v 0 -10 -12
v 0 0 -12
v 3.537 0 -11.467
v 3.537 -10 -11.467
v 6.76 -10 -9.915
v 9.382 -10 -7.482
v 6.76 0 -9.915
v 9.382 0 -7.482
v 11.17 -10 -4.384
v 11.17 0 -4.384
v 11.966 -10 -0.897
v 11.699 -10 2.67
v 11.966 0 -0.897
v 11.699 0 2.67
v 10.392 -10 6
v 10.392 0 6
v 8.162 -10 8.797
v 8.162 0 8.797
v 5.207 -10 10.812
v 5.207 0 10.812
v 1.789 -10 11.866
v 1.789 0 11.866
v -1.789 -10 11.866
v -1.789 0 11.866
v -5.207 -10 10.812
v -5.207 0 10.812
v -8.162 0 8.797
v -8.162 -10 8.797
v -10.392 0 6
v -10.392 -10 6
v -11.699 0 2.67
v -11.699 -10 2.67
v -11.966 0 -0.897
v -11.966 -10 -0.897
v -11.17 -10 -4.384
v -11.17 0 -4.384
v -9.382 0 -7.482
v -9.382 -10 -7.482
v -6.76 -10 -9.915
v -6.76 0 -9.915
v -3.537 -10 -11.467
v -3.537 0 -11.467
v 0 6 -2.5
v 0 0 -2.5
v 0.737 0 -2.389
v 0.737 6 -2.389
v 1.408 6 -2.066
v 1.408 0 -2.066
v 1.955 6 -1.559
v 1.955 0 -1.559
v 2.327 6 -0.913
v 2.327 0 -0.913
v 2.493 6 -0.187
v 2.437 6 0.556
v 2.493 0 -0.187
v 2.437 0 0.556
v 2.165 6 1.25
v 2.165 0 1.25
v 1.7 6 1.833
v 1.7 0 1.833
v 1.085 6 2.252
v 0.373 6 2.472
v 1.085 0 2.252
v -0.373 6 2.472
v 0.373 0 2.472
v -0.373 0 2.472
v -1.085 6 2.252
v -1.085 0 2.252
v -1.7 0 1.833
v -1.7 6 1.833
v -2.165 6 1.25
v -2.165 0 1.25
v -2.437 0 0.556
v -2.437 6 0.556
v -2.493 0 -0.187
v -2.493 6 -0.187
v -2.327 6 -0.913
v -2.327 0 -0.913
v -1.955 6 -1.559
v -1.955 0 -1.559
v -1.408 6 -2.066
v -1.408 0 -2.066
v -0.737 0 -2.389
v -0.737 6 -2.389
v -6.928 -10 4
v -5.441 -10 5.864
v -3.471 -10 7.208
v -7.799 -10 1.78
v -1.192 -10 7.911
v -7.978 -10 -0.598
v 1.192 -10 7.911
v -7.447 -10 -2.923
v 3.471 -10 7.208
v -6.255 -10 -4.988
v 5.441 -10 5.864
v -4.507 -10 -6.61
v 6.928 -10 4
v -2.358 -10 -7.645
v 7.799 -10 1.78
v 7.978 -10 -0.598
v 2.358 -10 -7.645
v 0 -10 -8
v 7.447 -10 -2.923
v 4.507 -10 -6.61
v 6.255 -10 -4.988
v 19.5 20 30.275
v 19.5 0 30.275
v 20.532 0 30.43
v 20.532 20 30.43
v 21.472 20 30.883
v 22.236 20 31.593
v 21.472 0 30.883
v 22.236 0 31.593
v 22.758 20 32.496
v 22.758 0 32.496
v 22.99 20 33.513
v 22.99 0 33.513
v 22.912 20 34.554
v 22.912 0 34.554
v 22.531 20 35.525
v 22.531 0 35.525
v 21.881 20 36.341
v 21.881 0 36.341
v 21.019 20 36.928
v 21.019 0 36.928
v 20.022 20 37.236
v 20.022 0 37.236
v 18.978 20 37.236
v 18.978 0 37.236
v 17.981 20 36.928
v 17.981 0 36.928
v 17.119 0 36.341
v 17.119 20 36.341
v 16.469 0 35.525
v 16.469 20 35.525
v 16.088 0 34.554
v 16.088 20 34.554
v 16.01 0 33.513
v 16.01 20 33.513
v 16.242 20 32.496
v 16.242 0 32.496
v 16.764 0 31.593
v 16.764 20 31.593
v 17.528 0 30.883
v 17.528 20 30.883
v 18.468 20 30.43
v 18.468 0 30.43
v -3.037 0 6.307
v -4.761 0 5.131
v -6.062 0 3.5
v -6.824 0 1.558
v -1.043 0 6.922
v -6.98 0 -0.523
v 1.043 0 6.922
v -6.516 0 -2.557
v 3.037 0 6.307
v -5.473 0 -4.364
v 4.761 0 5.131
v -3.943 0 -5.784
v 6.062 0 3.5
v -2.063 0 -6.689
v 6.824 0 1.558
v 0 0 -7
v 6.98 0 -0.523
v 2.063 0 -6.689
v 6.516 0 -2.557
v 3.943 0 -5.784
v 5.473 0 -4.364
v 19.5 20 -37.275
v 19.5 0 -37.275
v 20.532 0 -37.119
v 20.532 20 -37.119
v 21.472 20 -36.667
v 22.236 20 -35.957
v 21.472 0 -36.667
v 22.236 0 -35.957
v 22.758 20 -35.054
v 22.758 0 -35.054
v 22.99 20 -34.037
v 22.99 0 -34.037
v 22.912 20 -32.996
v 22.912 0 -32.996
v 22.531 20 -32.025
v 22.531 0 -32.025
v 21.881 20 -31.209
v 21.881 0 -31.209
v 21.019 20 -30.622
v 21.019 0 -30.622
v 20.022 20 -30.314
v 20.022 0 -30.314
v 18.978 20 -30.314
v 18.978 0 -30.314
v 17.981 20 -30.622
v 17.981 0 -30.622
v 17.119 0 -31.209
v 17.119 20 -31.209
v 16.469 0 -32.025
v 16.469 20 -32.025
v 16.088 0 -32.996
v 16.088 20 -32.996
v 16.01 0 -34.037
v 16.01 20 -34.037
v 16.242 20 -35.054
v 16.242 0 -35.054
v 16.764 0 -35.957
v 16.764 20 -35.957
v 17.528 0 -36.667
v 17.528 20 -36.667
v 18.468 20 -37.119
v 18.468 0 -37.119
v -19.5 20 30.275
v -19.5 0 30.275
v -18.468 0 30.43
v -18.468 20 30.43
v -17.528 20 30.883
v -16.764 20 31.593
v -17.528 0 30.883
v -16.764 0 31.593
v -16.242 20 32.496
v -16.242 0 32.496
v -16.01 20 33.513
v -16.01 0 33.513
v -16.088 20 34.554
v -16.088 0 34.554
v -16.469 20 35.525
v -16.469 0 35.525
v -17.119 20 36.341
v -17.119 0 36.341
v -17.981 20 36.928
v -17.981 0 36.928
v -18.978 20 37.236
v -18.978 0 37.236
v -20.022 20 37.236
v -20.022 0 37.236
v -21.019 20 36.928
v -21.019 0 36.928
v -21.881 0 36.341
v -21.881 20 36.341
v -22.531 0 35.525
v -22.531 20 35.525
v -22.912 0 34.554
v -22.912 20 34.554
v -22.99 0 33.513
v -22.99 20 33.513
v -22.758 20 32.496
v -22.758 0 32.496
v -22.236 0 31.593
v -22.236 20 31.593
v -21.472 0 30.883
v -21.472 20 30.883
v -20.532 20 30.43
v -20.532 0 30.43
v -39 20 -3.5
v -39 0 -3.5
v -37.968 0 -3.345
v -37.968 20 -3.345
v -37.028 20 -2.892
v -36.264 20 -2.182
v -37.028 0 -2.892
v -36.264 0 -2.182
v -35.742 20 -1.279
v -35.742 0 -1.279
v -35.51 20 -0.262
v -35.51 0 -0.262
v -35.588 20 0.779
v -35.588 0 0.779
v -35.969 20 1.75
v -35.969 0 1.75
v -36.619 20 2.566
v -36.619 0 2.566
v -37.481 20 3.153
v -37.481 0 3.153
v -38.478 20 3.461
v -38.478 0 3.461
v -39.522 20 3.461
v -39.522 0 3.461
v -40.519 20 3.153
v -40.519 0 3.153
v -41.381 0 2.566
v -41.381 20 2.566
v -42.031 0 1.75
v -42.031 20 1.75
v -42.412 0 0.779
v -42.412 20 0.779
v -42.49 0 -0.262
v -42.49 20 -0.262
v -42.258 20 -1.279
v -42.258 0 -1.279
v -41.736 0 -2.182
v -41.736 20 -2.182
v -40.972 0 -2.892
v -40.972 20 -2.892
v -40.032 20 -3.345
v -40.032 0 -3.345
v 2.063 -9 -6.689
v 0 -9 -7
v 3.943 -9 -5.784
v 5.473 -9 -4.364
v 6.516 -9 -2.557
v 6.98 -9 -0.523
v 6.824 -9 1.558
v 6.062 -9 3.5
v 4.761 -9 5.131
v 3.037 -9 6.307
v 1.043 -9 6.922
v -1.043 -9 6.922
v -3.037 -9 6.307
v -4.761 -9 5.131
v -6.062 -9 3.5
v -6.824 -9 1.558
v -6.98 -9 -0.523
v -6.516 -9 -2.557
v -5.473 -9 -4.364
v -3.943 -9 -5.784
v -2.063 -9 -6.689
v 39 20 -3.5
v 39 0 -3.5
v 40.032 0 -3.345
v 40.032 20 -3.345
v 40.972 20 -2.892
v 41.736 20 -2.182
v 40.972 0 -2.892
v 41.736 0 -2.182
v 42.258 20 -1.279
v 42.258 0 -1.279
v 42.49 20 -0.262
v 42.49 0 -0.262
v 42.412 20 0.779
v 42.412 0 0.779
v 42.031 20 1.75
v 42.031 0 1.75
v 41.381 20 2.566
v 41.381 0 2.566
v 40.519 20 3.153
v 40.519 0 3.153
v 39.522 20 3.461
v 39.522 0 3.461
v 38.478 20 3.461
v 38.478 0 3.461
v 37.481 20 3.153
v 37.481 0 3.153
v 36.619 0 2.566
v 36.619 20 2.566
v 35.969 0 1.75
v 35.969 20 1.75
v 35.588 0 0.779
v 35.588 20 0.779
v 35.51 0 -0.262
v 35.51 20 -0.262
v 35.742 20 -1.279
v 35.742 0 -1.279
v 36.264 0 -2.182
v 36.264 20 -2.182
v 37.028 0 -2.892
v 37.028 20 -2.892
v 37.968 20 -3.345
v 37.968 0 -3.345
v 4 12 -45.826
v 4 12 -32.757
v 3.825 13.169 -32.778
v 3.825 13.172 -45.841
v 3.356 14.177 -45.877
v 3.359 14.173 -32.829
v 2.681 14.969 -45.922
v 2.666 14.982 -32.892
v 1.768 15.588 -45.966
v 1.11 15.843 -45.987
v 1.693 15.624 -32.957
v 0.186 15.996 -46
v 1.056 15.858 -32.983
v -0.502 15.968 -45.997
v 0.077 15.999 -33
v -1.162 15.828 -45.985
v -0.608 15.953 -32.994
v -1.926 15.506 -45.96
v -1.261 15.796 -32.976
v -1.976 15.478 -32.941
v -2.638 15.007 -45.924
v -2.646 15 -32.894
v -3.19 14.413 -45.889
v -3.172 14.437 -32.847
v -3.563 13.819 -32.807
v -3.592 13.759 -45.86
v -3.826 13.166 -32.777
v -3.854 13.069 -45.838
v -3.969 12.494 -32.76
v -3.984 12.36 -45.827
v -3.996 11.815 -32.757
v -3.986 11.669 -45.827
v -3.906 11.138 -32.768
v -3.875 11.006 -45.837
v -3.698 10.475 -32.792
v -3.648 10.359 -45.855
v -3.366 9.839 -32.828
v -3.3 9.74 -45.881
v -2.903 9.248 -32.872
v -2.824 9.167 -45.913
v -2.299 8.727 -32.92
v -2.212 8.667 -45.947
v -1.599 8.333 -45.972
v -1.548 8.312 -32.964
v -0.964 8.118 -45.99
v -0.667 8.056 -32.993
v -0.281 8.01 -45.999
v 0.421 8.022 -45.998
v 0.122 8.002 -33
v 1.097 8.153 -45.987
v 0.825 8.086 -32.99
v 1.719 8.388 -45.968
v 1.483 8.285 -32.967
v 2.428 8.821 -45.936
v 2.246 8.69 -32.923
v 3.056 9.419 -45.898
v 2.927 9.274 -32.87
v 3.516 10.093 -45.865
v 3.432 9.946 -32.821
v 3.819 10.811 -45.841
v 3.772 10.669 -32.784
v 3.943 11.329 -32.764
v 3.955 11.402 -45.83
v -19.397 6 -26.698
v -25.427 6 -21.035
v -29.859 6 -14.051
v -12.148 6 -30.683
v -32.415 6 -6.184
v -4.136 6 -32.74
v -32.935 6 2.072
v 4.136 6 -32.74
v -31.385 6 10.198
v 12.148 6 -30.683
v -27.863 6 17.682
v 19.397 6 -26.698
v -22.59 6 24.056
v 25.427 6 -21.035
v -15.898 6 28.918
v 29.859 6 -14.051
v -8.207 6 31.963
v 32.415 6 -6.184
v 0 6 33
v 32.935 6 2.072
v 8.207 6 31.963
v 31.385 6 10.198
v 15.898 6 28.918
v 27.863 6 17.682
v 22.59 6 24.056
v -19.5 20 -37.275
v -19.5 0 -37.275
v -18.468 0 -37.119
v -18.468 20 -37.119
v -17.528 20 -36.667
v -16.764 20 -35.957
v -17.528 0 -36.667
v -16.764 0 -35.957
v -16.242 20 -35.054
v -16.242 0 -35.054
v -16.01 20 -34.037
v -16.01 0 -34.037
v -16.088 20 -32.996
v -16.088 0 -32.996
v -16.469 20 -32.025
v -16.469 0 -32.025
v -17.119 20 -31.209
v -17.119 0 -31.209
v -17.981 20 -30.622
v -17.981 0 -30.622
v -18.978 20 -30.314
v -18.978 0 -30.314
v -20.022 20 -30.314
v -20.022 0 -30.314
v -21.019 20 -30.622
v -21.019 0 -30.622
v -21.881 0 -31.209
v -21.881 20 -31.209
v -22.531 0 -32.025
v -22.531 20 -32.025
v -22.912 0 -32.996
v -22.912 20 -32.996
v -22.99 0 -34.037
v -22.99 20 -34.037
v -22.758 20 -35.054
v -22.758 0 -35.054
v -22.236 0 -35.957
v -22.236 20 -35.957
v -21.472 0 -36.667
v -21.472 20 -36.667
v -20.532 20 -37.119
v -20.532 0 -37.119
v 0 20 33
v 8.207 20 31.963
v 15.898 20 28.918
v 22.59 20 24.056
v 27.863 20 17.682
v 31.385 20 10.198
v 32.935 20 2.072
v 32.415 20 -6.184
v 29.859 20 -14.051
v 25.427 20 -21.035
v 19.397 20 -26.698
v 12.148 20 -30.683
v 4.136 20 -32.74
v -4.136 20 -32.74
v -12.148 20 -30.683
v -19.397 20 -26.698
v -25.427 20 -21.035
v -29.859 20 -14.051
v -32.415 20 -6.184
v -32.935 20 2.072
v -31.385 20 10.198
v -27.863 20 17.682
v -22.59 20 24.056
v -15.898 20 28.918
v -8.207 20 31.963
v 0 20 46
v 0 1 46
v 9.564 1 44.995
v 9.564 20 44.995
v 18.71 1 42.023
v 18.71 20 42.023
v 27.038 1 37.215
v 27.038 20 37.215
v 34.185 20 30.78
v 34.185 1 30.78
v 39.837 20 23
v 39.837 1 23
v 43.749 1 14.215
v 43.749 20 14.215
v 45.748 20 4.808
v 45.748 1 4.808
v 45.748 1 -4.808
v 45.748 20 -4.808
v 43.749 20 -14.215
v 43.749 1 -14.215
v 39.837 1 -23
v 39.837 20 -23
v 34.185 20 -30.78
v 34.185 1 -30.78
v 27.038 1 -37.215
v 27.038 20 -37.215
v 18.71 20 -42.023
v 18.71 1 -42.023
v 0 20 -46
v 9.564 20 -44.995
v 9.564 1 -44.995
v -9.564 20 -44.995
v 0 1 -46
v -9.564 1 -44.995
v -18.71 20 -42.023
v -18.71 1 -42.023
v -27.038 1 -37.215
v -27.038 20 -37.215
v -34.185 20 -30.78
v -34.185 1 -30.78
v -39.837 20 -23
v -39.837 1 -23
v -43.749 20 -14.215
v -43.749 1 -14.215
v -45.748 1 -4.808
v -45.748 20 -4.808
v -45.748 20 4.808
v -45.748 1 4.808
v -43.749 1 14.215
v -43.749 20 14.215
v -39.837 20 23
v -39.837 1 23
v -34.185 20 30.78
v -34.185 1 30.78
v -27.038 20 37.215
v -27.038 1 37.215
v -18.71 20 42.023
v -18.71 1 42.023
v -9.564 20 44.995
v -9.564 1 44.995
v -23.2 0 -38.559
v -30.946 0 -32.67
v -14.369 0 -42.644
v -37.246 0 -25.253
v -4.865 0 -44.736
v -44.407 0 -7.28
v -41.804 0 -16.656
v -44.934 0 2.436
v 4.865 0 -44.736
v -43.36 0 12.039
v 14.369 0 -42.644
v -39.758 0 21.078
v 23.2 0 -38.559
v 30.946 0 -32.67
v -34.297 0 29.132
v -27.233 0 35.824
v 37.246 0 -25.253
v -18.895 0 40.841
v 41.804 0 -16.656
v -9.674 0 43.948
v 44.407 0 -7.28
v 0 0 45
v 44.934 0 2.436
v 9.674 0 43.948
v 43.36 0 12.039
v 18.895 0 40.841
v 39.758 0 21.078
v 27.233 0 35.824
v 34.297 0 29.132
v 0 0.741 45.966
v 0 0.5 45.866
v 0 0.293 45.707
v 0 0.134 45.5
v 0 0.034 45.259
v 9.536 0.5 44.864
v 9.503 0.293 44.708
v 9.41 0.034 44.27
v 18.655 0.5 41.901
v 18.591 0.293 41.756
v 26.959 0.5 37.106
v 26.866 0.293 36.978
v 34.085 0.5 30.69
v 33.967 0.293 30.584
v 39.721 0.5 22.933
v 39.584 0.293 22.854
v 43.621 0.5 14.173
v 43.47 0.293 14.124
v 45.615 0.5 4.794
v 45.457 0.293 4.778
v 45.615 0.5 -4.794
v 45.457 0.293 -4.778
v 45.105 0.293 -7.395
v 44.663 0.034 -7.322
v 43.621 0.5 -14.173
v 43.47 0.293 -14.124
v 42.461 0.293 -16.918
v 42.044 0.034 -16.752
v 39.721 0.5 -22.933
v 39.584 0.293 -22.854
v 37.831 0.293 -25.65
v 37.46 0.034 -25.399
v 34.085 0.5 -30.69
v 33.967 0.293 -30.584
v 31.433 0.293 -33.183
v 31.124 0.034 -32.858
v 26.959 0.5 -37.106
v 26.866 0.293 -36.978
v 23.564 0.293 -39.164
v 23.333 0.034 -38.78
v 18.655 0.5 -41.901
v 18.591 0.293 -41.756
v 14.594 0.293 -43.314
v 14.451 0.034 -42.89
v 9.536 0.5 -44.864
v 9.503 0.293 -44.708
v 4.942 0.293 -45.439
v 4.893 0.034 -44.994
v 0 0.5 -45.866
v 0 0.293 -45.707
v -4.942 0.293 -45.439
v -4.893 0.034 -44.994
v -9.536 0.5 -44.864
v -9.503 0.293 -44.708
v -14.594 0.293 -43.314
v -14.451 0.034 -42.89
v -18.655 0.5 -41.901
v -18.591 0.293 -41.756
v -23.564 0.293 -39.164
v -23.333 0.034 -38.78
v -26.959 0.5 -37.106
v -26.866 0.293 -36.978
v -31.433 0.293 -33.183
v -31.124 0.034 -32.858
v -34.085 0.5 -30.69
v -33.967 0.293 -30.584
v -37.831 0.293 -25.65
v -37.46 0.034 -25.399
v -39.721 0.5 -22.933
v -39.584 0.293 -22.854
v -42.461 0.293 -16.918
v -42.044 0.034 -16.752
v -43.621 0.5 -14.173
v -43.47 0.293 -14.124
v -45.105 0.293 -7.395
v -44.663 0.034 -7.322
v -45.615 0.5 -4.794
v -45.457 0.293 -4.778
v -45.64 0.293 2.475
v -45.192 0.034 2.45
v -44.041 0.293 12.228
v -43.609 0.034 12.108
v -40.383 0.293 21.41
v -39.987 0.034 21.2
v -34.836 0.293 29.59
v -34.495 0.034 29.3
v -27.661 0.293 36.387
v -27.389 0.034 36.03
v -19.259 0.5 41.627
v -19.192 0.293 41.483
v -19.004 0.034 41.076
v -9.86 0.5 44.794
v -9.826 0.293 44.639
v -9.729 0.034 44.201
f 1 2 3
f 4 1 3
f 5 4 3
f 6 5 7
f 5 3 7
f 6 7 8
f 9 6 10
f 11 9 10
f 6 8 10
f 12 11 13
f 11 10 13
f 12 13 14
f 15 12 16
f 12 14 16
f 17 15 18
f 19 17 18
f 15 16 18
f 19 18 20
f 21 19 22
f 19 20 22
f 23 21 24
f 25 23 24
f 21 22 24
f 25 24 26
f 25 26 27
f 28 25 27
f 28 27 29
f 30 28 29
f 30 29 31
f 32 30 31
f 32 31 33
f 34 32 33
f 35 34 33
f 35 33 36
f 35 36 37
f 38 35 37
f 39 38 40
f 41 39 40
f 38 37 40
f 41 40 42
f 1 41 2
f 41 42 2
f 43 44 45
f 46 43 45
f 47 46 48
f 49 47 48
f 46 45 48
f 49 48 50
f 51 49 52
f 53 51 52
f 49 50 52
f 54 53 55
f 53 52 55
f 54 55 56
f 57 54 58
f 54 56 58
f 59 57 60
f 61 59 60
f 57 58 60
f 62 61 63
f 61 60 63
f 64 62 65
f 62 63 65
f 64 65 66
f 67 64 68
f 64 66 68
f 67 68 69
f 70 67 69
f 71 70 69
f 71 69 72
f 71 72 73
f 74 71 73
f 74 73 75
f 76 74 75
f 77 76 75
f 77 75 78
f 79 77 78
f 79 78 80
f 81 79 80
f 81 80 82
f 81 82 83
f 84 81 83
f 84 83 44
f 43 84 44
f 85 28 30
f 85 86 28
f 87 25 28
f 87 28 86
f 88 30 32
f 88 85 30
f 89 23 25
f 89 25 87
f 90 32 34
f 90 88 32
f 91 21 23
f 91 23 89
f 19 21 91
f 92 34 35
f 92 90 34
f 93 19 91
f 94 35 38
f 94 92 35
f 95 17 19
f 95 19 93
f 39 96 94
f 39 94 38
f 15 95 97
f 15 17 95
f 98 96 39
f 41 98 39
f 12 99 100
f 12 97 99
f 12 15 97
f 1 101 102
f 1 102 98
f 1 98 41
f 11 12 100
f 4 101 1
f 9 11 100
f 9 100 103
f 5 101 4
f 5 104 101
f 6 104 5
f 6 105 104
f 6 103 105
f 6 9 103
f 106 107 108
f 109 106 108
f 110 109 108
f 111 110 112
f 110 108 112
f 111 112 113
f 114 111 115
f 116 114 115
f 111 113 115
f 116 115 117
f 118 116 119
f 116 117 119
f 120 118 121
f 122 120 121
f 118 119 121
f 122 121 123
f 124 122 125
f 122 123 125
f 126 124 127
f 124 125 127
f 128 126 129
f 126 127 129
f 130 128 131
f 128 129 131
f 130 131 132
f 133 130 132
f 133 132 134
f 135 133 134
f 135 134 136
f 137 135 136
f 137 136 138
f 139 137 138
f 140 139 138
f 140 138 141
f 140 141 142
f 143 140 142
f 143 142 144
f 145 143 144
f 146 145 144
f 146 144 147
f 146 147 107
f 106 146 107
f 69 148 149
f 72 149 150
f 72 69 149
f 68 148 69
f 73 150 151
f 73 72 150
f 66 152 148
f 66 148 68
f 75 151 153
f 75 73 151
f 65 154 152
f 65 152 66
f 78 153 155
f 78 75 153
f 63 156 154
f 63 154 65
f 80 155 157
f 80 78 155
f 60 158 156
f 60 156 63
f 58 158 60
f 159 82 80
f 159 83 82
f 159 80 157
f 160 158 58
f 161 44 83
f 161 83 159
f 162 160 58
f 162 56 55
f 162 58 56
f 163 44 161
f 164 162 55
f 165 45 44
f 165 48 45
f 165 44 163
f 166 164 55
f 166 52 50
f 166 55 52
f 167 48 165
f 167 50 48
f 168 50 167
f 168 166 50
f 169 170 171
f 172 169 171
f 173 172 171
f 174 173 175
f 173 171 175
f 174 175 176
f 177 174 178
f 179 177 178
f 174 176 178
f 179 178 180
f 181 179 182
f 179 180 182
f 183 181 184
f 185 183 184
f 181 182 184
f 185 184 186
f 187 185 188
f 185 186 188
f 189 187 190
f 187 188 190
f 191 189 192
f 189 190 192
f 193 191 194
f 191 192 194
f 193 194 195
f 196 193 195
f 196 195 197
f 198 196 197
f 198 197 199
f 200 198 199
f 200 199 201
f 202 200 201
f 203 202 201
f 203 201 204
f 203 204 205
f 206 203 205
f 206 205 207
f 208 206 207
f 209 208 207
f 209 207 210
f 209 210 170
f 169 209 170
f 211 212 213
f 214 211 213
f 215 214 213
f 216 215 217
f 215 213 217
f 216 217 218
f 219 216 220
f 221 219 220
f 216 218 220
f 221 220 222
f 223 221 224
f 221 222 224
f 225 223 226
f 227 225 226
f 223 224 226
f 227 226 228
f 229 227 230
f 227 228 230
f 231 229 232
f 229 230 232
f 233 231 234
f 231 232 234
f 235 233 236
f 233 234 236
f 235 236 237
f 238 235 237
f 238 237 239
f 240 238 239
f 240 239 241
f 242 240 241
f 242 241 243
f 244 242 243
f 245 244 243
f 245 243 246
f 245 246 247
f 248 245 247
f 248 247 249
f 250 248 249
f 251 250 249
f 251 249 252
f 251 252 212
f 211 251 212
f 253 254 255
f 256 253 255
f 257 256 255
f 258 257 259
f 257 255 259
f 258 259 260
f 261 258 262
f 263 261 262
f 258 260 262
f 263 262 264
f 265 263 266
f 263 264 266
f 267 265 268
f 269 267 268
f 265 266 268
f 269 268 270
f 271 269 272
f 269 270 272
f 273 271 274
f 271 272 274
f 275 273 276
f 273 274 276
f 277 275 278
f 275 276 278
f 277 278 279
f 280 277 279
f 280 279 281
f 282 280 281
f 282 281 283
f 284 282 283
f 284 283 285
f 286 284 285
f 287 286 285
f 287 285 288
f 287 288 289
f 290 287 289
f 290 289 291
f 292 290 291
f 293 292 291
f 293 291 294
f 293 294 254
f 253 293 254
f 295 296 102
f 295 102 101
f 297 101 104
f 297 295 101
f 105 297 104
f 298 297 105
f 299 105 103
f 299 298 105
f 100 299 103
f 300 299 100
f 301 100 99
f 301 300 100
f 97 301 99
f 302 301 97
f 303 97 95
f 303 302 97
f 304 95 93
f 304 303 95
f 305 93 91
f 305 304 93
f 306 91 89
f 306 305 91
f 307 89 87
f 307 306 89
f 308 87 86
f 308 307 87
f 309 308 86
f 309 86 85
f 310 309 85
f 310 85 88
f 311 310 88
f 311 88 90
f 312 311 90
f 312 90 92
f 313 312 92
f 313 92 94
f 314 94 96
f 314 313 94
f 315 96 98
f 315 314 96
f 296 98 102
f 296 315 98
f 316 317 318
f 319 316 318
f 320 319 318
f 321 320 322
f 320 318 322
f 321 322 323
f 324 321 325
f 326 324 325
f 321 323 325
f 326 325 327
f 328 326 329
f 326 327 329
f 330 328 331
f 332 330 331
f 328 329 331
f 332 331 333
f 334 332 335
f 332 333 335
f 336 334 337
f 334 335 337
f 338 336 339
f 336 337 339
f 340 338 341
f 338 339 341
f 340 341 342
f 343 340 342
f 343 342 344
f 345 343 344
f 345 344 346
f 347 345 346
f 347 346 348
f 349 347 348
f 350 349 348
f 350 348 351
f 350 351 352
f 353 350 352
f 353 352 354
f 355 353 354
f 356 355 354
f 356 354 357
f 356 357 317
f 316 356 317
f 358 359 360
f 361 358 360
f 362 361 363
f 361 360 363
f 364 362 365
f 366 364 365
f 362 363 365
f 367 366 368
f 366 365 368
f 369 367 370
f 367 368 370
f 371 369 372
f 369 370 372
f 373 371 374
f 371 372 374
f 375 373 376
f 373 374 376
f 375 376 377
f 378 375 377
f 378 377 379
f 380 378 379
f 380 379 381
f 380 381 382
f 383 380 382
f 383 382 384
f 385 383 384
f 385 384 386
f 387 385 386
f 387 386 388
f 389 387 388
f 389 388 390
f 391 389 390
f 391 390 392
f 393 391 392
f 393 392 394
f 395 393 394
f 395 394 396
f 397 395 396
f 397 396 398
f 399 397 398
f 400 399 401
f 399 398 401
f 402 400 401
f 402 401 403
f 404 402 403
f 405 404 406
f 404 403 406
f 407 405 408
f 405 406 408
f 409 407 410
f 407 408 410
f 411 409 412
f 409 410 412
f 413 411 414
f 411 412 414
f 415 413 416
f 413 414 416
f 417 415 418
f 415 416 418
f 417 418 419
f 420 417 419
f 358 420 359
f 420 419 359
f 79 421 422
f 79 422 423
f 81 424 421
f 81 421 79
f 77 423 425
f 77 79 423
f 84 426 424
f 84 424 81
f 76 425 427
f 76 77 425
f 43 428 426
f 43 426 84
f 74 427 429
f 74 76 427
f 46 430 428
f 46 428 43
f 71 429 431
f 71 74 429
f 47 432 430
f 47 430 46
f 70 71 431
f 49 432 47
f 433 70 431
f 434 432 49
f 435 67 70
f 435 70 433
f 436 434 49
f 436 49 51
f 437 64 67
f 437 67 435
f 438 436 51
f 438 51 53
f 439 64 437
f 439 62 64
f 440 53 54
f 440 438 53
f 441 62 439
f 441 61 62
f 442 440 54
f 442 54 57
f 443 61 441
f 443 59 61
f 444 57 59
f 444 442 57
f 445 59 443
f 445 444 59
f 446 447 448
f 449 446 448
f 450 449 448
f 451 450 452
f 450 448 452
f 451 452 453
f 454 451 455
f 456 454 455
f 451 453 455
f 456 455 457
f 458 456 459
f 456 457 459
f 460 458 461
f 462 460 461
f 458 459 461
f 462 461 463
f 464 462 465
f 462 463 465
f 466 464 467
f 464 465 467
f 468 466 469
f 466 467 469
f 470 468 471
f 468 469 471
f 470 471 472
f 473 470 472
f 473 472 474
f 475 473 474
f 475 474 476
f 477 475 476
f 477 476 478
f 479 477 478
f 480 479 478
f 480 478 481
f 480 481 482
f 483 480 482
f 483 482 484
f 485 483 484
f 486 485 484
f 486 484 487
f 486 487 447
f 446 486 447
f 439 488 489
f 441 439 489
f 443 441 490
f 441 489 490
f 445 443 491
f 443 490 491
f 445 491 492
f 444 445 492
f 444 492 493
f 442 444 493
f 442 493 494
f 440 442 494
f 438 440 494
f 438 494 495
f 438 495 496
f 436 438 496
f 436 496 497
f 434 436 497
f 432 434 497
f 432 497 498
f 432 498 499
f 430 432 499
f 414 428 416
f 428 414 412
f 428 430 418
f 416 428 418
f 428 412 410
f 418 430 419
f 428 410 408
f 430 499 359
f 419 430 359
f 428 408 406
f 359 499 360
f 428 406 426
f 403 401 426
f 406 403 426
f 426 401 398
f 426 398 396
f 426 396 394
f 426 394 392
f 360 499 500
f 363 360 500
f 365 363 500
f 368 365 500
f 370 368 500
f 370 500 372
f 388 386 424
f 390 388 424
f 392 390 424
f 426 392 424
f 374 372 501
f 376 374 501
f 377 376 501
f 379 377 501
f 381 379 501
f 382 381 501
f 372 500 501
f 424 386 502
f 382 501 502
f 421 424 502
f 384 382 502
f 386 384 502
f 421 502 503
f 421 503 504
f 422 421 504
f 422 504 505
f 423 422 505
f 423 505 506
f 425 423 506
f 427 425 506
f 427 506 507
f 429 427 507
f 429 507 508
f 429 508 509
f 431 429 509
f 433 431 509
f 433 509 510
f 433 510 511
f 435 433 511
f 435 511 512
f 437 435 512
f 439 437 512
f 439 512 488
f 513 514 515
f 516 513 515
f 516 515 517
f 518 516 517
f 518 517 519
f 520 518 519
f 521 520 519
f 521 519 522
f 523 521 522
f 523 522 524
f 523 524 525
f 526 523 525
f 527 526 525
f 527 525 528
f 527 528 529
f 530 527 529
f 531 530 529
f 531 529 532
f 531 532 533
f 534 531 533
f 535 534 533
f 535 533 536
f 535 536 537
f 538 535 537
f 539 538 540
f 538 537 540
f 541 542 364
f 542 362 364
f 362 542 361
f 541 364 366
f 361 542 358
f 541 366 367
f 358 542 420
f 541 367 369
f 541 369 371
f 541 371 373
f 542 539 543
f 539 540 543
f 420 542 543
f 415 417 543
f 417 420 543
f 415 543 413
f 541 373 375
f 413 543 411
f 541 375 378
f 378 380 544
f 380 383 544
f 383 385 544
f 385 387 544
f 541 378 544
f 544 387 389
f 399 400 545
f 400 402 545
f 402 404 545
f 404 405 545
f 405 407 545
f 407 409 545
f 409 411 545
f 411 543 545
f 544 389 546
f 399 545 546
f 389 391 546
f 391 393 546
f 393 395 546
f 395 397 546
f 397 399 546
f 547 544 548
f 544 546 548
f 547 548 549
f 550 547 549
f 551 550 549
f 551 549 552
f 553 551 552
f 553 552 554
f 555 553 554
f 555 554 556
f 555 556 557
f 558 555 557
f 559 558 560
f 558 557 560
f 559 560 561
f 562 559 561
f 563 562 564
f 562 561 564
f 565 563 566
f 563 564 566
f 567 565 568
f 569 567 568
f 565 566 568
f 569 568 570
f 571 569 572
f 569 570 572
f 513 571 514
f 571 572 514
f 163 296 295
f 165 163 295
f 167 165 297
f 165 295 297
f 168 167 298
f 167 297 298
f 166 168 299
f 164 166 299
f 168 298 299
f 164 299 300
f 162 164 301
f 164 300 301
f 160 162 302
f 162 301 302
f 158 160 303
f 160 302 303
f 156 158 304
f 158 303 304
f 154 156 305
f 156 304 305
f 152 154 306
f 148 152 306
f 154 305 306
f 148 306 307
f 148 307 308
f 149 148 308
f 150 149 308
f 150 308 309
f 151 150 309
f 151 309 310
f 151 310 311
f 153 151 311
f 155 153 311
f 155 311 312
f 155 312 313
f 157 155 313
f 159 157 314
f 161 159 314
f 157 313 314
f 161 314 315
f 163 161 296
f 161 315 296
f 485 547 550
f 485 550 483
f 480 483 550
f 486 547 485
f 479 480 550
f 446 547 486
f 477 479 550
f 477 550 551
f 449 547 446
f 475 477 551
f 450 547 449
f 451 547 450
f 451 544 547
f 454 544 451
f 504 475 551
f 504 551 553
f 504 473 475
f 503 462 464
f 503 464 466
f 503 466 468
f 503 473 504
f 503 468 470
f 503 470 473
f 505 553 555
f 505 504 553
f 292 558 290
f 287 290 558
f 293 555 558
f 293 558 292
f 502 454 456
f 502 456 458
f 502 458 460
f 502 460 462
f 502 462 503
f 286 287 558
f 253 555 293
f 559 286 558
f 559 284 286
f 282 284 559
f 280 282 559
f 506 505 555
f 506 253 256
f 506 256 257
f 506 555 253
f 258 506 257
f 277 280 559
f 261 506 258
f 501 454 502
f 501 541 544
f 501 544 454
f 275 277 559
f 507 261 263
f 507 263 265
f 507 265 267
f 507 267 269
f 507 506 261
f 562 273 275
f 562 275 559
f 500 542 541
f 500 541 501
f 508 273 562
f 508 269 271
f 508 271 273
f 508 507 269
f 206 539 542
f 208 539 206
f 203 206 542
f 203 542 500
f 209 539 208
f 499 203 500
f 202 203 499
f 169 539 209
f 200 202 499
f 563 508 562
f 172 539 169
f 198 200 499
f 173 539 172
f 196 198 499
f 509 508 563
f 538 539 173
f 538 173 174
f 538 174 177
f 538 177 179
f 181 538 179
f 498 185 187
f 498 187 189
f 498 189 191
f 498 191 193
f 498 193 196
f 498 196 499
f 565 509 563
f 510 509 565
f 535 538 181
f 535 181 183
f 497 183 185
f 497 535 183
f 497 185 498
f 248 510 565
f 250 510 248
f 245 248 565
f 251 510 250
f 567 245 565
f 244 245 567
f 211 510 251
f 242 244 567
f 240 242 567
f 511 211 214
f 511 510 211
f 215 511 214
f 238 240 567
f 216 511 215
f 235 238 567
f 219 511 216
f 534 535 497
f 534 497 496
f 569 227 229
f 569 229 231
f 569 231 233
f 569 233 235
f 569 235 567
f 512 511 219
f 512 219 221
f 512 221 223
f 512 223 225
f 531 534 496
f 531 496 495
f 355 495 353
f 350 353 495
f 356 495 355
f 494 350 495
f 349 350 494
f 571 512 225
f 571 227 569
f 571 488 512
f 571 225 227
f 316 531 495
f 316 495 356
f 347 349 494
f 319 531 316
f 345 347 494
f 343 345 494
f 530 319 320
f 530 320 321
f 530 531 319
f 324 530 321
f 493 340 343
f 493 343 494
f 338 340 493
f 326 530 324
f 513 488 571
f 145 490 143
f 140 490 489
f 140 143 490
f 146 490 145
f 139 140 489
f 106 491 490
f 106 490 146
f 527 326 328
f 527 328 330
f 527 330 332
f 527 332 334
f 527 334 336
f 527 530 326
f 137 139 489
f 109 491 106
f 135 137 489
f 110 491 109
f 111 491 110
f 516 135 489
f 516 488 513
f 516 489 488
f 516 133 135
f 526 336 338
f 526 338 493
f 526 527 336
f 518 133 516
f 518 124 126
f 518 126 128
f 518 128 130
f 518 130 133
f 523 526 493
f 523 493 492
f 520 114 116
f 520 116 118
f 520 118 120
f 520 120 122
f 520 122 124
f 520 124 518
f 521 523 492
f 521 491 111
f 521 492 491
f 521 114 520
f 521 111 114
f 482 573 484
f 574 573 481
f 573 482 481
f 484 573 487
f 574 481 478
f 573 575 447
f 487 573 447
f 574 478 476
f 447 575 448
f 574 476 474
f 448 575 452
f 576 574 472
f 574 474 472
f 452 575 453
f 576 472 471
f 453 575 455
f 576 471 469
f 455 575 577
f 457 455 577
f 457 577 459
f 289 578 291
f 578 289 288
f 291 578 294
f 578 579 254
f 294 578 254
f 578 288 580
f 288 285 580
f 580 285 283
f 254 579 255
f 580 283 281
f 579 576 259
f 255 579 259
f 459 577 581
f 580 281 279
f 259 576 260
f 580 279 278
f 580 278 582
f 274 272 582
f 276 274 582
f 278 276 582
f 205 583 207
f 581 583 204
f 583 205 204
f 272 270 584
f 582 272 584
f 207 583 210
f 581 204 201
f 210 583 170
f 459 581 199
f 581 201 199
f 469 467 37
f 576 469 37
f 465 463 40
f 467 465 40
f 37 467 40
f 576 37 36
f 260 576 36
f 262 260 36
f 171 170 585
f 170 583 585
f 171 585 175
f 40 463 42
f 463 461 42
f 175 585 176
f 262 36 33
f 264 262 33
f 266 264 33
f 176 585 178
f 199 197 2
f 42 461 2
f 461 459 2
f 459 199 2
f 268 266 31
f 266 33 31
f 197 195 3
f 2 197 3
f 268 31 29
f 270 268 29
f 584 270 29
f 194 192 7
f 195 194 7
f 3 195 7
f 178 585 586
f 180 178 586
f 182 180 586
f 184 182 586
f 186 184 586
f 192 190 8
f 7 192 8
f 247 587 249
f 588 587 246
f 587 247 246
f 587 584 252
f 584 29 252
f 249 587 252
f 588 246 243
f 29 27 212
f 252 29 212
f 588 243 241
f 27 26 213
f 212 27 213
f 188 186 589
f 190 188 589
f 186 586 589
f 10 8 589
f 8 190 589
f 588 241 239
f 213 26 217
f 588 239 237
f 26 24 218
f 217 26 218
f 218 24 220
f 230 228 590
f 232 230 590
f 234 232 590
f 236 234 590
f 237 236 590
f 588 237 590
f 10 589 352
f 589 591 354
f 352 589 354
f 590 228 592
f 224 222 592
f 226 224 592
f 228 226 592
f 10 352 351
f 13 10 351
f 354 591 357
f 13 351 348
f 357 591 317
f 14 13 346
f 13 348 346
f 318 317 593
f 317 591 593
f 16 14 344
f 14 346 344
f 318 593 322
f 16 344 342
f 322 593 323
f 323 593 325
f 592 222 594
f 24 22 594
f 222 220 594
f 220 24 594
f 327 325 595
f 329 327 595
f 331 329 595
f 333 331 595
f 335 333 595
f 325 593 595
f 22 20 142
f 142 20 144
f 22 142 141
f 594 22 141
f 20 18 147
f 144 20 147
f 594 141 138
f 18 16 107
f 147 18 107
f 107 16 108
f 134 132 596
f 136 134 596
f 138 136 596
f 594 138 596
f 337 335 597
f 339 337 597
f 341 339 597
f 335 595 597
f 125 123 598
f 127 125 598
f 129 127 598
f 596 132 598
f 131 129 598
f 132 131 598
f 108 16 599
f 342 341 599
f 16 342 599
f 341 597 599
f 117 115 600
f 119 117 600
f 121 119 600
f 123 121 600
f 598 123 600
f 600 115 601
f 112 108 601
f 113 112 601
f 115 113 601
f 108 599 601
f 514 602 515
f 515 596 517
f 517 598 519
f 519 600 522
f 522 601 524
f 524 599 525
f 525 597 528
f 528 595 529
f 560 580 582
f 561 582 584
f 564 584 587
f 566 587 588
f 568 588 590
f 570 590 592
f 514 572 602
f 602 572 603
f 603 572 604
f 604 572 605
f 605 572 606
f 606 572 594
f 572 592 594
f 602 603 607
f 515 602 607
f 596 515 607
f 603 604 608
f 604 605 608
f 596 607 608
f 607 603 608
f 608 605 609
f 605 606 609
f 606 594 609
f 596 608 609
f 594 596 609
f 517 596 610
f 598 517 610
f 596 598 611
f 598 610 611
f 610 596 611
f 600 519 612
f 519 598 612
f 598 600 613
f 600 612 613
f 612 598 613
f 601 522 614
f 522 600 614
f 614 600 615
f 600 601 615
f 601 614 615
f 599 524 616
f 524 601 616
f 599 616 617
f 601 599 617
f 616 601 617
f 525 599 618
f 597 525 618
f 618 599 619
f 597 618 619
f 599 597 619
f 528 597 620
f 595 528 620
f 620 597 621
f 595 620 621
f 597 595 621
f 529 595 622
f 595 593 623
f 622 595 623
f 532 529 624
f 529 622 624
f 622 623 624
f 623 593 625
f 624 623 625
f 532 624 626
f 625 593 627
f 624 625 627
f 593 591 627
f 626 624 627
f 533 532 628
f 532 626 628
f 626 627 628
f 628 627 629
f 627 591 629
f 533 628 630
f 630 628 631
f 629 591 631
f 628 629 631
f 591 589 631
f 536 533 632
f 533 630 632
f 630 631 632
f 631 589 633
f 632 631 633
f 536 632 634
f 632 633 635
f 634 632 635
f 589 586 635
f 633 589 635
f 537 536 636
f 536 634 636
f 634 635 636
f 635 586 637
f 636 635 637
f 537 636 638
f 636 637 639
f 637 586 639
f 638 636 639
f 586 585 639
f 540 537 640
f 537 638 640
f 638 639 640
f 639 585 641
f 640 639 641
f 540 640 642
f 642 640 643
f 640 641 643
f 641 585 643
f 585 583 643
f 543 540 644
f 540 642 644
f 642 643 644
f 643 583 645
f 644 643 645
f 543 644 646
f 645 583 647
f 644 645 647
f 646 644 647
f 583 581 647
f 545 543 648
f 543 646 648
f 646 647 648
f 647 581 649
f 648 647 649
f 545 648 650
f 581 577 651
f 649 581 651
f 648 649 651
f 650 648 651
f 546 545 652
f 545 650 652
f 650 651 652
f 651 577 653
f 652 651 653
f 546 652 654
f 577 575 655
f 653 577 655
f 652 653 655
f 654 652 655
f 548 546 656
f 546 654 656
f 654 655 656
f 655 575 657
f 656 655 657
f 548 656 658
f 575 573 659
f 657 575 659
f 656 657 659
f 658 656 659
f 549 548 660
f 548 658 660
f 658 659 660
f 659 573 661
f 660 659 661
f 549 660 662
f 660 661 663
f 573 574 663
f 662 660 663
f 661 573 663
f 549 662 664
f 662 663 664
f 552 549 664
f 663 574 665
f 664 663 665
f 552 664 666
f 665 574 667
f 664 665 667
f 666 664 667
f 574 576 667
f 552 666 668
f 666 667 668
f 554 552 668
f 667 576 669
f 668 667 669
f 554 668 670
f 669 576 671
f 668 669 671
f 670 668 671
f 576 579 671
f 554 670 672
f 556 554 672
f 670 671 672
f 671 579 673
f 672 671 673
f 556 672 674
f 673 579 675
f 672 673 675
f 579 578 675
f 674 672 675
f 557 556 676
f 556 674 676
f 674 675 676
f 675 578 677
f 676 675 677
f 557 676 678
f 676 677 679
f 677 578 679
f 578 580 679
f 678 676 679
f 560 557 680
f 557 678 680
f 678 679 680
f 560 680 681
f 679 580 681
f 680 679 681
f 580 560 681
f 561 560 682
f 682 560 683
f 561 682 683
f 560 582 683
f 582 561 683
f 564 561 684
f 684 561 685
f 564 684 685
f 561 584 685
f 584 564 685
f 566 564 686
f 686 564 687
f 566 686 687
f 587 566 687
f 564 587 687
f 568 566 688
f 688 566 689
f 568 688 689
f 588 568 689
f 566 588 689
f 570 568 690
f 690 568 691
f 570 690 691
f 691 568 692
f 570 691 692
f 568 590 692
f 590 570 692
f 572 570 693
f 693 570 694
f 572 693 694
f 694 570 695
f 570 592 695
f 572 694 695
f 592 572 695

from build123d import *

# Parameters (mm, degrees)
SKETCH1_R           = 46
BOSS_EXTRUDE1_DEPTH = 20
SKETCH2_R           = 12
BOSS_EXTRUDE2_DEPTH = 10
SKETCH3_R           = 33
CUT_EXTRUDE1_DEPTH  = 14
SKETCH4_R           = 2.5
CUT_EXTRUDE2_DEPTH  = 72.637978754
SKETCH5_R           = 3.5
CUT_EXTRUDE3_DEPTH  = 69.058798109
FILLET1_R           = 1
SKETCH6_R           = 7
CUT_EXTRUDE4_DEPTH  = 10
CHAMFER1_SIZE       = 1
SKETCH8_R           = 4
CUT_EXTRUDE5_DEPTH  = 250


with BuildPart() as part:
    # Sketch1 → Boss-Extrude1 (new body)
    with BuildSketch(Plane(origin=(0, 0, 0), x_dir=(1, 0, 0), z_dir=(0, 1, 0))):
        with Locations(Location((0, 0, 0), (0, 0, 270))):
            Circle(SKETCH1_R)
    extrude(amount=BOSS_EXTRUDE1_DEPTH)

    # Sketch2 → Boss-Extrude2 (add)
    with BuildSketch(Plane.XZ):
        with Locations(Location((0, 0, 0), (0, 0, 270))):
            Circle(SKETCH2_R)
    extrude(amount=BOSS_EXTRUDE2_DEPTH)

    # Sketch3 → Cut-Extrude1 (cut)
    with BuildSketch(Plane(origin=(0, 20, 0), x_dir=(1, 0, 0), z_dir=(0, 1, 0))):
        with Locations(Location((0, 0, 0), (0, 0, 270))):
            Circle(SKETCH3_R)
    extrude(amount=-CUT_EXTRUDE1_DEPTH, mode=Mode.SUBTRACT)

    # Sketch4 → Cut-Extrude2 (cut, through all)
    with BuildSketch(Plane.XZ.offset(10)):
        with Locations(Location((0, 0, 0), (0, 0, 270))):
            Circle(SKETCH4_R)
    extrude(amount=-CUT_EXTRUDE2_DEPTH, mode=Mode.SUBTRACT)

    # Sketch5 → Cut-Extrude3 (cut, through all)
    with BuildSketch(Plane.XZ):
        with Locations(Location((-39, 0, 0), (0, 0, 270))):
            Circle(SKETCH5_R)
        with Locations(Location((-19.5, 33.774990748, 0), (0, 0, 270))):
            Circle(SKETCH5_R)
        with Locations(Location((19.5, 33.774990748, 0), (0, 0, 270))):
            Circle(SKETCH5_R)
        with Locations(Location((39, 0, 0), (0, 0, 270))):
            Circle(SKETCH5_R)
        with Locations(Location((19.5, -33.774990748, 0), (0, 0, 270))):
            Circle(SKETCH5_R)
        with Locations(Location((-19.5, -33.774990748, 0), (0, 0, 270))):
            Circle(SKETCH5_R)
    extrude(amount=-CUT_EXTRUDE3_DEPTH, mode=Mode.SUBTRACT)

    # Fillet1
    fillet1_edges = [part.edges().sort_by_distance(p)[0] for p in [
        (0, 0, -46),
    ]]
    fillet(fillet1_edges, radius=FILLET1_R)

    # Sketch6 → Cut-Extrude4 (cut)
    with BuildSketch(Plane.XZ.offset(10)):
        with Locations(Location((0, 0, 0), (0, 0, 270))):
            Circle(SKETCH6_R)
    extrude(amount=-CUT_EXTRUDE4_DEPTH, mode=Mode.SUBTRACT)

    # Chamfer1
    chamfer1_edges = [part.edges().sort_by_distance(p)[0] for p in [
        (0, -10, 7),
    ]]
    chamfer(chamfer1_edges, length=CHAMFER1_SIZE)

    # Sketch8 → Cut-Extrude5 (cut)
    with BuildSketch(Plane.XY):
        with Locations((0, 12)):
            Circle(SKETCH8_R)
    extrude(amount=-CUT_EXTRUDE5_DEPTH, mode=Mode.SUBTRACT)


solid = part.part
